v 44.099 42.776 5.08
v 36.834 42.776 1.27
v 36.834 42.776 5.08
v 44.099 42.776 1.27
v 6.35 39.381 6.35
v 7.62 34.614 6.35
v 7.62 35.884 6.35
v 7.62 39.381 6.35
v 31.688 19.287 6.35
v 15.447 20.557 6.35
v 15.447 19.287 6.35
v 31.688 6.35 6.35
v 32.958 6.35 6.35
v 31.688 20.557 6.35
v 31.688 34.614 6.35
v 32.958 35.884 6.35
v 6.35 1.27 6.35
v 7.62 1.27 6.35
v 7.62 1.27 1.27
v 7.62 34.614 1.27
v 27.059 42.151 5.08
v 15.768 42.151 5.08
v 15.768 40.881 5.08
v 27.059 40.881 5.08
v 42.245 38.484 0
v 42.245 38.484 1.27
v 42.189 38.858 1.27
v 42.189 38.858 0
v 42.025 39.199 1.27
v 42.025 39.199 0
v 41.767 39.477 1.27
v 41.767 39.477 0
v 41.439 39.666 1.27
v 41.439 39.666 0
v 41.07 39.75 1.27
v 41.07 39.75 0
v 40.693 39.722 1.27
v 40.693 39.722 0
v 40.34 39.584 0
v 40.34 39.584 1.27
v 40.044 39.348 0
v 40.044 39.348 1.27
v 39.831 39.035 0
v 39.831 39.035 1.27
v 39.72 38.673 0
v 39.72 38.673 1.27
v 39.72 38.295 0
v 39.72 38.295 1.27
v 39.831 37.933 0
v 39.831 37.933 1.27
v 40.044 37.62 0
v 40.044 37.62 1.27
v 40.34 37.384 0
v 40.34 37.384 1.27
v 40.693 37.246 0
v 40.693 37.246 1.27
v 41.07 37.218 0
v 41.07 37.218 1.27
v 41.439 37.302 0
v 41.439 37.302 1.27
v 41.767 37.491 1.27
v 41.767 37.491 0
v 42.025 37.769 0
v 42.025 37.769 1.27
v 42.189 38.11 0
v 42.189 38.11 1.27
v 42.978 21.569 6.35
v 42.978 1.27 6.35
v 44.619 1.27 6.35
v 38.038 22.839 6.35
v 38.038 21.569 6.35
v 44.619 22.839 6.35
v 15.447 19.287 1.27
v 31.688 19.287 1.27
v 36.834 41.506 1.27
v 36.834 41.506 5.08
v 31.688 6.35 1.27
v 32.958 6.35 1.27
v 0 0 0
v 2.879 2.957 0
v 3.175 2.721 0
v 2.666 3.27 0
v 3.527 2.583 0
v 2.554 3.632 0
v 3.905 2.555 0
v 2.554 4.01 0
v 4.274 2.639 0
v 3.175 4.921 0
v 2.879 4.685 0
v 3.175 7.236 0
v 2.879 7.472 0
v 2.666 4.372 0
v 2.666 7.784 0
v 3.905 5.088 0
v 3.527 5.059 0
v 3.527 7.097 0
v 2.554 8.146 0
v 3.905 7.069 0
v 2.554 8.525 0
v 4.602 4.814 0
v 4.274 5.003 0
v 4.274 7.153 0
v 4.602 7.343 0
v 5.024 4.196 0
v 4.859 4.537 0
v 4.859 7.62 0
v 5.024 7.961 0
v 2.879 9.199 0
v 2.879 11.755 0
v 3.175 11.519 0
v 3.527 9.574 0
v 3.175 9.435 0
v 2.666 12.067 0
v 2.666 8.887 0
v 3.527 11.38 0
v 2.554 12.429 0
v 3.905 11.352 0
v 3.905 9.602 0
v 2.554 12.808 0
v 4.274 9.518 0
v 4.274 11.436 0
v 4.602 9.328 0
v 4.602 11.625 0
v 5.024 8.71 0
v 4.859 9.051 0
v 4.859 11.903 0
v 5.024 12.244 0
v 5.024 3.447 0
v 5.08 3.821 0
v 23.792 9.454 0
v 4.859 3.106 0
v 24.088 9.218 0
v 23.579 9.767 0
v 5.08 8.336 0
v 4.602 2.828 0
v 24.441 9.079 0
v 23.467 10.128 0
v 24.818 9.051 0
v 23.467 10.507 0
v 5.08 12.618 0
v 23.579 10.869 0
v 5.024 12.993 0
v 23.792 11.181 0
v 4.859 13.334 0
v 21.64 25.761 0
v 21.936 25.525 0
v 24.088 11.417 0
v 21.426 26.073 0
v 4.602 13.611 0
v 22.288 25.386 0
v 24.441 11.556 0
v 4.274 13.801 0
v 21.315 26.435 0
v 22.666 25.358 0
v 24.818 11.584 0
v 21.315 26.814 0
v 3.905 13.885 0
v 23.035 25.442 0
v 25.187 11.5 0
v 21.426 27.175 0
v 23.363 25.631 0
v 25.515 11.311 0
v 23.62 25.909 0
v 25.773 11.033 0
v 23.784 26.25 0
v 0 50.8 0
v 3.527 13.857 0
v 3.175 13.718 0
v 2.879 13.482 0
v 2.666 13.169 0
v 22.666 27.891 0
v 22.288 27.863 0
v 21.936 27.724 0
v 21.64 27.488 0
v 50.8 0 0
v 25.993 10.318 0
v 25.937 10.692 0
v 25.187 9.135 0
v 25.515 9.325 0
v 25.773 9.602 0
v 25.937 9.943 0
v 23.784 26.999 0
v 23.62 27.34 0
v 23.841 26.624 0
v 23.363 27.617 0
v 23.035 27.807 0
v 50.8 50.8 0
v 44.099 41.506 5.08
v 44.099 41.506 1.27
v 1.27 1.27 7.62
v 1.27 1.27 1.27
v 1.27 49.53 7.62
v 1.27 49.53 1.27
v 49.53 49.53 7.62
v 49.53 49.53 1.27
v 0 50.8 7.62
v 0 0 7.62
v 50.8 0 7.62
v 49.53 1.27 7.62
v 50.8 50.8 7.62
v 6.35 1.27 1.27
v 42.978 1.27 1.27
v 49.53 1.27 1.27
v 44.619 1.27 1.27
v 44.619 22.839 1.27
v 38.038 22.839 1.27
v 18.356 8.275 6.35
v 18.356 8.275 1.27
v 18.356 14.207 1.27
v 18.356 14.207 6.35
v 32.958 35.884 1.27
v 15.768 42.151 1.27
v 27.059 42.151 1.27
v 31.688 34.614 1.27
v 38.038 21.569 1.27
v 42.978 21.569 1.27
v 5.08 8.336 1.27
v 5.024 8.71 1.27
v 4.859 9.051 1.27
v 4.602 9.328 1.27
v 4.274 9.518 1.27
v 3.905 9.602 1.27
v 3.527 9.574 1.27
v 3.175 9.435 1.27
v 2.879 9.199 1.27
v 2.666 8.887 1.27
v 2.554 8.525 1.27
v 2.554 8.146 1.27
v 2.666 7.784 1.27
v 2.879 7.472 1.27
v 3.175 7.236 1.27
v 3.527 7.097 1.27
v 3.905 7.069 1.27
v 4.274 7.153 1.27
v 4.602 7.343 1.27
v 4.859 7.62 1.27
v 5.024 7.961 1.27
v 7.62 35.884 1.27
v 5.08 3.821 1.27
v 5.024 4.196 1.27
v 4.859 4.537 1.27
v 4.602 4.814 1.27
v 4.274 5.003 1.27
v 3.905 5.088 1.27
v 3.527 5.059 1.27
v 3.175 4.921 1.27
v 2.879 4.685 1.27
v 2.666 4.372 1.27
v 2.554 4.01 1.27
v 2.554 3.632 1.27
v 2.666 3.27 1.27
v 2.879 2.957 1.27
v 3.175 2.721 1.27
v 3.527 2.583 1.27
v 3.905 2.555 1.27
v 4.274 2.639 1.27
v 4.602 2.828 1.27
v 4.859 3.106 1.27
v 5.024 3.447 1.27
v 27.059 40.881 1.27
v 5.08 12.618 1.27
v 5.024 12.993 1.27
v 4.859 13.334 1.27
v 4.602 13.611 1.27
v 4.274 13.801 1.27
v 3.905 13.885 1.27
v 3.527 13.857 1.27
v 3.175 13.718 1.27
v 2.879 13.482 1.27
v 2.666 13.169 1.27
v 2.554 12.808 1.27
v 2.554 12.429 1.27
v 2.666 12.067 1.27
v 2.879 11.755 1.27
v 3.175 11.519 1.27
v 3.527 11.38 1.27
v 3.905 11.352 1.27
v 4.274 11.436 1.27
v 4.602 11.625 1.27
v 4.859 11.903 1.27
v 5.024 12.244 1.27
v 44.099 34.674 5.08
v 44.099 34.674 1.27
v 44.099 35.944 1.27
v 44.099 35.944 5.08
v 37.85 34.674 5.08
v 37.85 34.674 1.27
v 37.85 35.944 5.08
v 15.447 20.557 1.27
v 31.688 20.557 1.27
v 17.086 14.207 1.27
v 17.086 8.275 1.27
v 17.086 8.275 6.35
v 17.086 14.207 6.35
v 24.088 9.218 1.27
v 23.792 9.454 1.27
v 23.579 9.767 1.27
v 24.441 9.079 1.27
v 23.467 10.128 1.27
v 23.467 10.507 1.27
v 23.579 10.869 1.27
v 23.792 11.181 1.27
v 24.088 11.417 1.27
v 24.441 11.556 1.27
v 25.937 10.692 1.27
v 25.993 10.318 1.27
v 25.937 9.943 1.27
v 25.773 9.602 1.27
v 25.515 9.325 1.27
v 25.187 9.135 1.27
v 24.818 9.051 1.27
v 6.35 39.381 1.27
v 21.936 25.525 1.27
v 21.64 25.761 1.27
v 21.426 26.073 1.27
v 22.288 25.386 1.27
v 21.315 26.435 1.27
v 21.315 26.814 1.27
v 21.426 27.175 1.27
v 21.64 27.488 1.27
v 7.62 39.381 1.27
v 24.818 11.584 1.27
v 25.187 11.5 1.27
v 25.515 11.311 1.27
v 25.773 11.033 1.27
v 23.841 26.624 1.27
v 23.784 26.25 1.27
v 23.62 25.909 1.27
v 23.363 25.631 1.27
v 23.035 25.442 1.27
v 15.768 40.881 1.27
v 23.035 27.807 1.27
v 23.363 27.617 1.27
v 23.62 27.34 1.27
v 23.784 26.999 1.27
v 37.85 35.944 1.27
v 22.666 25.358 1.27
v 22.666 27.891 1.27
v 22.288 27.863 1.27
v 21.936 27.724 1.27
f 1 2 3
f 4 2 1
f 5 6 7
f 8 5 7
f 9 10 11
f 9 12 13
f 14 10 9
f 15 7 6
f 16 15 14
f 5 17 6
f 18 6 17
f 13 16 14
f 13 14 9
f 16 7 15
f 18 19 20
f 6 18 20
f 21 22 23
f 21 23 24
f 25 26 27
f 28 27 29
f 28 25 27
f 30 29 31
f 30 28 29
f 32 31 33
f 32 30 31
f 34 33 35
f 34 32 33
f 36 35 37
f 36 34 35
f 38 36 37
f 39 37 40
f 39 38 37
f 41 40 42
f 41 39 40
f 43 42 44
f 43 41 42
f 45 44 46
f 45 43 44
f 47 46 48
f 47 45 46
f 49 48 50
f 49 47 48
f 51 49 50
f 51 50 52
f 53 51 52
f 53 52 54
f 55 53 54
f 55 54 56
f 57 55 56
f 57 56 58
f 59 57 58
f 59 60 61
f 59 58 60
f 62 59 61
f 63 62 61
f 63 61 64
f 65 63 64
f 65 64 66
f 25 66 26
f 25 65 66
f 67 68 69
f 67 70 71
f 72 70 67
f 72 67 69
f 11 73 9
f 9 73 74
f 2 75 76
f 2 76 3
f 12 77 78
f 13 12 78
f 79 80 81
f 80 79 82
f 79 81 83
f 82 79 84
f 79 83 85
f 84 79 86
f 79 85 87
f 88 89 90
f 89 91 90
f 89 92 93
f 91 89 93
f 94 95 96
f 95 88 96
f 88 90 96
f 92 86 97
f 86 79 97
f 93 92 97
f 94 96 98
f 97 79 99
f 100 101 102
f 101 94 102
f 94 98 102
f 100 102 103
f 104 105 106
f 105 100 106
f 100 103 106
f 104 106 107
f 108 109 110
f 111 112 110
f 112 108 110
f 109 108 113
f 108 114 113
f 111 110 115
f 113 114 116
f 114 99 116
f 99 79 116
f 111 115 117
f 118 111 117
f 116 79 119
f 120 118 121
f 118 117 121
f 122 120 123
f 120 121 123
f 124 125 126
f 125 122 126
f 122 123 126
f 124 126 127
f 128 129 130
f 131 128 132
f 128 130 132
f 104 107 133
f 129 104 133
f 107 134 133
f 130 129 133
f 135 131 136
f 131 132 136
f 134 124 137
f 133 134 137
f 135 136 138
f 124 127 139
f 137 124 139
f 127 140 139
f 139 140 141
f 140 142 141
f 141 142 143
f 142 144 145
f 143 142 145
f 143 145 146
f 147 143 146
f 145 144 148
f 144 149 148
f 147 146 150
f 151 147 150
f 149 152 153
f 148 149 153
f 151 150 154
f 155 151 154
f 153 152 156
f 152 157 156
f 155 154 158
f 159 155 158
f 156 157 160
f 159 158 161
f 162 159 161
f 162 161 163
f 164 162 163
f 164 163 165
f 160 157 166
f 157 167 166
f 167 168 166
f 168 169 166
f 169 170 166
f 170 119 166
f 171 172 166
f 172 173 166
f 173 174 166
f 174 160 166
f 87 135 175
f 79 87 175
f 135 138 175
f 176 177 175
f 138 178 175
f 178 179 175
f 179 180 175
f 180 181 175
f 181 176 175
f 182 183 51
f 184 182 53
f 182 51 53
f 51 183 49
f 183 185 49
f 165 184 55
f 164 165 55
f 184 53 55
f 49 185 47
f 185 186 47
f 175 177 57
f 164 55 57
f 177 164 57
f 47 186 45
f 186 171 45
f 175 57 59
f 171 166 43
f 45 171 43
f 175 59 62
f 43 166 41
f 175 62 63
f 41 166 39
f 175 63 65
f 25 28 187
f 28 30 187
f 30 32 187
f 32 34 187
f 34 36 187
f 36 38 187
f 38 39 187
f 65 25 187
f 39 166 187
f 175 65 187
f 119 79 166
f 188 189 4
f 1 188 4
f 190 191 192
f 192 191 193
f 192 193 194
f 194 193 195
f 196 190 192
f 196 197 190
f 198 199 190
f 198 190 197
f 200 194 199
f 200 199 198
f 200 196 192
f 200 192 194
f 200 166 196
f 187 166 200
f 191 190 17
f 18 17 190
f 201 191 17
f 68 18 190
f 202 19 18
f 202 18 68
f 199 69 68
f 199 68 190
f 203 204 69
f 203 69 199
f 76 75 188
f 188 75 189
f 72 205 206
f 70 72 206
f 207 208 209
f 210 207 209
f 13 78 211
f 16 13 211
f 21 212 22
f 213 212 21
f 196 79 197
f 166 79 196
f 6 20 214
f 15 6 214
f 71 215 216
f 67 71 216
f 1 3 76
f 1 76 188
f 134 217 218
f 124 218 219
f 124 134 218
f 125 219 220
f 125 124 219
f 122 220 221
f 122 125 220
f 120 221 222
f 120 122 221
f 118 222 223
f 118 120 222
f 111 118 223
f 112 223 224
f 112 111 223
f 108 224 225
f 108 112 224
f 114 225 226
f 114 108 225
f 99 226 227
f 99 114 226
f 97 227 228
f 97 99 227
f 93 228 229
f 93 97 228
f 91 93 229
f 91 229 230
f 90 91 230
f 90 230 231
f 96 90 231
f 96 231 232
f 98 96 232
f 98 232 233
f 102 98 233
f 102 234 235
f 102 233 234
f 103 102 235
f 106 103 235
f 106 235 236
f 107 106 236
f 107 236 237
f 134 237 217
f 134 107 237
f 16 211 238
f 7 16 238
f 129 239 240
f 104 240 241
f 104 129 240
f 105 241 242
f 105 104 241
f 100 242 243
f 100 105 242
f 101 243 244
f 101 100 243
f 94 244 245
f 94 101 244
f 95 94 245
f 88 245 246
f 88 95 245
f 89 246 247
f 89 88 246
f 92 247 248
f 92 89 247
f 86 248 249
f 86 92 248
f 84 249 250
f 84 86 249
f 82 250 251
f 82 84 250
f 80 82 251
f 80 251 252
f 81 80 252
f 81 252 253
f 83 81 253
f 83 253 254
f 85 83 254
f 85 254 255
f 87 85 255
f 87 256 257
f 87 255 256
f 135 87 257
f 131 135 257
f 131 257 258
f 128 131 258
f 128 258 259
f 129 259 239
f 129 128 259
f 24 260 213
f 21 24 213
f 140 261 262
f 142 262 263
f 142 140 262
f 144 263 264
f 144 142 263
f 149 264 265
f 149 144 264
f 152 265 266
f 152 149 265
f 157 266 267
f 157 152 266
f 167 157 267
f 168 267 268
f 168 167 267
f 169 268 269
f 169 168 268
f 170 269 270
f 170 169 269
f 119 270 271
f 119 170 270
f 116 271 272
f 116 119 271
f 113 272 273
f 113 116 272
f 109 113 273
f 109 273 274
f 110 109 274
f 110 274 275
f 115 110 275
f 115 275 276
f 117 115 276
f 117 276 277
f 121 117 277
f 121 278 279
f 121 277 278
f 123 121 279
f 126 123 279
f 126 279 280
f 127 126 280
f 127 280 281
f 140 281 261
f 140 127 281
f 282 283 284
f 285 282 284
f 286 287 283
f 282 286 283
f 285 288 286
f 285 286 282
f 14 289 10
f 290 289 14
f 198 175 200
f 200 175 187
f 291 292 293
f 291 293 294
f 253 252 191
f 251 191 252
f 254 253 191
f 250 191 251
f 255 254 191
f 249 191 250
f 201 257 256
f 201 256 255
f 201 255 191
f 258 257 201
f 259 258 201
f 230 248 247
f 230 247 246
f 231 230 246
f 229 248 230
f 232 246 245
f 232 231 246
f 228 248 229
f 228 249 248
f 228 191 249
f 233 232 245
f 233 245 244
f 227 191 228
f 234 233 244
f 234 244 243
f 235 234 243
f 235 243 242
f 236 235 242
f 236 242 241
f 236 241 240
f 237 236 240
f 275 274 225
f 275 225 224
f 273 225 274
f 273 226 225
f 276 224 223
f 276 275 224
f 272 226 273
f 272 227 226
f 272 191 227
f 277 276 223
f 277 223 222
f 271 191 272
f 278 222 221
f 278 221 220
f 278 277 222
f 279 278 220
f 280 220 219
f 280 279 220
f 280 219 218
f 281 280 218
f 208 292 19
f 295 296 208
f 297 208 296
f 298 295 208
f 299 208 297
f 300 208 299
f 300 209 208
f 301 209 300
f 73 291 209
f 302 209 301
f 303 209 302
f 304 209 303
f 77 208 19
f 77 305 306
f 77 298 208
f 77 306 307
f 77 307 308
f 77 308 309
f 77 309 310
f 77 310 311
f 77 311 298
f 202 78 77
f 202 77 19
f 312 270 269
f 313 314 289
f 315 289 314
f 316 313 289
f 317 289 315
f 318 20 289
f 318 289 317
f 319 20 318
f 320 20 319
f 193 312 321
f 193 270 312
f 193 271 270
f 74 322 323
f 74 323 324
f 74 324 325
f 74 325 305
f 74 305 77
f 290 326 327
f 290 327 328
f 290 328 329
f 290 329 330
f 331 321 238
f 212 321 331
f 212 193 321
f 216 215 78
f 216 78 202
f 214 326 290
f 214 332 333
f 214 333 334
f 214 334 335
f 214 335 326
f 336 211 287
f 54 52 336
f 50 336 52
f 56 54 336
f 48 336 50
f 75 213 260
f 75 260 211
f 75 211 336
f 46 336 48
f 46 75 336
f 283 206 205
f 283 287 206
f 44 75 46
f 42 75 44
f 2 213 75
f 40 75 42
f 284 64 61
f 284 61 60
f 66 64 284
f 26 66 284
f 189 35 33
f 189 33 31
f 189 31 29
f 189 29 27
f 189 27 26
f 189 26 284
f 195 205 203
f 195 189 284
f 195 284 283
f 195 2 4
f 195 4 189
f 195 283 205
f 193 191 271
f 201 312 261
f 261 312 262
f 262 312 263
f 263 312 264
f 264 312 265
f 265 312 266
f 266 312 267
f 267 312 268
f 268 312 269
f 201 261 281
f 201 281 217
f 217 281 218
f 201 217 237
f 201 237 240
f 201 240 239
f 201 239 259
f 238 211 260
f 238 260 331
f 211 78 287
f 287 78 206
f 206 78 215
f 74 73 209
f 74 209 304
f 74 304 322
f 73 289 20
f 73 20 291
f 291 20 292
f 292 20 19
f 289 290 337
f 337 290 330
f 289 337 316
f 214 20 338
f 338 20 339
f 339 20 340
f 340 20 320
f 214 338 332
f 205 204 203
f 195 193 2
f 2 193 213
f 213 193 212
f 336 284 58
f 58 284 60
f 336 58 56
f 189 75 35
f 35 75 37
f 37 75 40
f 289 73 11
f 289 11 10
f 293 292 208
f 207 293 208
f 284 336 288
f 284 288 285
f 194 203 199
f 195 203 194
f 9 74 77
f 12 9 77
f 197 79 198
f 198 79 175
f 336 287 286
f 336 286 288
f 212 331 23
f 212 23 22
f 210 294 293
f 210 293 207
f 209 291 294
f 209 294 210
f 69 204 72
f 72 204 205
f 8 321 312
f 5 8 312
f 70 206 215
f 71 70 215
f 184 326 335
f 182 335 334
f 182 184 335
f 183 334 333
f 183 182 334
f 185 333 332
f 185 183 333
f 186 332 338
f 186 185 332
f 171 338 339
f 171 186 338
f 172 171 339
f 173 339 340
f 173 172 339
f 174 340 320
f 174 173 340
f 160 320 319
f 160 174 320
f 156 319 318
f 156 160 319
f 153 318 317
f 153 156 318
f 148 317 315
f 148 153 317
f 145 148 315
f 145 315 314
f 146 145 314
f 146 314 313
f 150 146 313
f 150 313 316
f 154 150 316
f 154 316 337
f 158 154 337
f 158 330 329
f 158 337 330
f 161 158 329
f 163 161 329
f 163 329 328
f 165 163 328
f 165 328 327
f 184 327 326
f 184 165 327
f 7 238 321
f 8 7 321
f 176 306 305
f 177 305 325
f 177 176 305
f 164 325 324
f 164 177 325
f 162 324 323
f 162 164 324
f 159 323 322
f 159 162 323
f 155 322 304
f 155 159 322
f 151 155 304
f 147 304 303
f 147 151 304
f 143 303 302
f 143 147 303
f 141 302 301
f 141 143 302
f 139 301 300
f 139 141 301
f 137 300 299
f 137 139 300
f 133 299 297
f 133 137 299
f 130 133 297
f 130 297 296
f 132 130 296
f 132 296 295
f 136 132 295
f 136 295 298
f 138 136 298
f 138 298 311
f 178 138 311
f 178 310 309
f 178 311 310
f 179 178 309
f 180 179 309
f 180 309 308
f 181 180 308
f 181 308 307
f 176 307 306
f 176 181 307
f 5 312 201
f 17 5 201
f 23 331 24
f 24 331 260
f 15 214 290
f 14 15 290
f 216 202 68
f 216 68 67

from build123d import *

# Parameters (mm, degrees)
F0_W      = 50.8
F0_H      = 50.8
F1_DEPTH  = 7.62
F2_T      = -1.27
F3_W      = 16.2406819105
F3_H      = 1.27
F3_W_2    = 1.27
F3_H_2    = 5.9315557909
F3_W_3    = 24.0681569266
F3_W_4    = 1.640137285
F3_H_3    = 20.2985386211
F4_DEPTH  = 5.08
F5_W      = 7.2644
F5_H      = 1.27
F5_W_2    = 6.2484
F6_DEPTH  = 5.08
F7_R      = 1.27
F8_DEPTH  = 203.2
F9_W      = 11.2909469754
F9_H      = 1.27
F10_DEPTH = 5.08
F11_R     = 1.27
F12_DEPTH = 203.2


with BuildPart() as f1:
    # F0 (on Top) → F1 (new body)
    with BuildSketch(Plane.XY):
        with Locations((25.4, 25.4)):
            Rectangle(F0_W, F0_H)
    extrude(amount=F1_DEPTH)

    # F2
    f2_openings = [f1.faces().sort_by_distance(p)[0] for p in [
        (25.4, 25.4, 7.62),
    ]]
    offset(amount=F2_T, openings=f2_openings)

    # F3 (on face) → F4 (join)
    with BuildSketch(Plane.XY.offset(1.27)):
        Polygon((6.35, 39.3808744848), (6.35, 1.27), (7.62, 1.27), (7.62, 34.6140562403), (7.62, 35.8840562403), (7.62, 39.3808744848), align=None)
        with Locations((23.5678159714, 19.9215934223)):
            Rectangle(F3_W, F3_H)
        with Locations((17.7206453478, 11.2408155268)):
            Rectangle(F3_W_2, F3_H_2)
        Polygon((31.6881569266, 35.8840562403), (31.6881569266, 34.6140562403), (31.6881569266, 20.5565934223), (31.6881569266, 19.2865934223), (31.6881569266, 6.35), (32.9581569266, 6.35), (32.9581569266, 35.8840562403), align=None)
        with Locations((19.6540784633, 35.2490562403)):
            Rectangle(F3_W_3, F3_H)
        Polygon((38.0381569266, 21.5685386211), (42.9784730077, 21.5685386211), (44.6186102927, 21.5685386211), (44.6186102927, 22.8385386211), (38.0381569266, 22.8385386211), align=None)
        with Locations((43.7985416502, 11.4192693105)):
            Rectangle(F3_W_4, F3_H_3)
    extrude(amount=F4_DEPTH)

    # F5 (on Top) → F6 (join)
    with BuildSketch(Plane.XY):
        with Locations((40.4664789763, 42.1414506233)):
            Rectangle(F5_W, F5_H)
        with Locations((40.9744789763, 35.3089962697)):
            Rectangle(F5_W_2, F5_H)
    extrude(amount=F6_DEPTH)

    # F7 (on Top) → F8 (cut)
    with BuildSketch(Plane.XY):
        with Locations((3.81, 3.8211722858)):
            Circle(F7_R)
        with Locations((3.81, 8.3355149254)):
            Circle(F7_R)
        with Locations((3.81, 12.6183535904)):
            Circle(F7_R)
        with Locations((40.9753248096, 38.4839962697)):
            Circle(F7_R)
        with Locations((22.5706957281, 26.6243927181)):
            Circle(F7_R)
    extrude(amount=F8_DEPTH, mode=Mode.SUBTRACT)

    # F9 (on Top) → F10 (join)
    with BuildSketch(Plane.XY):
        with Locations((21.4138692245, 41.5160228109)):
            Rectangle(F9_W, F9_H)
    extrude(amount=F10_DEPTH)

    # F11 (on Top) → F12 (cut)
    with BuildSketch(Plane.XY):
        with Locations((24.7232858092, 10.317591019)):
            Circle(F11_R)
    extrude(amount=F12_DEPTH, mode=Mode.SUBTRACT)


solid = f1.part
